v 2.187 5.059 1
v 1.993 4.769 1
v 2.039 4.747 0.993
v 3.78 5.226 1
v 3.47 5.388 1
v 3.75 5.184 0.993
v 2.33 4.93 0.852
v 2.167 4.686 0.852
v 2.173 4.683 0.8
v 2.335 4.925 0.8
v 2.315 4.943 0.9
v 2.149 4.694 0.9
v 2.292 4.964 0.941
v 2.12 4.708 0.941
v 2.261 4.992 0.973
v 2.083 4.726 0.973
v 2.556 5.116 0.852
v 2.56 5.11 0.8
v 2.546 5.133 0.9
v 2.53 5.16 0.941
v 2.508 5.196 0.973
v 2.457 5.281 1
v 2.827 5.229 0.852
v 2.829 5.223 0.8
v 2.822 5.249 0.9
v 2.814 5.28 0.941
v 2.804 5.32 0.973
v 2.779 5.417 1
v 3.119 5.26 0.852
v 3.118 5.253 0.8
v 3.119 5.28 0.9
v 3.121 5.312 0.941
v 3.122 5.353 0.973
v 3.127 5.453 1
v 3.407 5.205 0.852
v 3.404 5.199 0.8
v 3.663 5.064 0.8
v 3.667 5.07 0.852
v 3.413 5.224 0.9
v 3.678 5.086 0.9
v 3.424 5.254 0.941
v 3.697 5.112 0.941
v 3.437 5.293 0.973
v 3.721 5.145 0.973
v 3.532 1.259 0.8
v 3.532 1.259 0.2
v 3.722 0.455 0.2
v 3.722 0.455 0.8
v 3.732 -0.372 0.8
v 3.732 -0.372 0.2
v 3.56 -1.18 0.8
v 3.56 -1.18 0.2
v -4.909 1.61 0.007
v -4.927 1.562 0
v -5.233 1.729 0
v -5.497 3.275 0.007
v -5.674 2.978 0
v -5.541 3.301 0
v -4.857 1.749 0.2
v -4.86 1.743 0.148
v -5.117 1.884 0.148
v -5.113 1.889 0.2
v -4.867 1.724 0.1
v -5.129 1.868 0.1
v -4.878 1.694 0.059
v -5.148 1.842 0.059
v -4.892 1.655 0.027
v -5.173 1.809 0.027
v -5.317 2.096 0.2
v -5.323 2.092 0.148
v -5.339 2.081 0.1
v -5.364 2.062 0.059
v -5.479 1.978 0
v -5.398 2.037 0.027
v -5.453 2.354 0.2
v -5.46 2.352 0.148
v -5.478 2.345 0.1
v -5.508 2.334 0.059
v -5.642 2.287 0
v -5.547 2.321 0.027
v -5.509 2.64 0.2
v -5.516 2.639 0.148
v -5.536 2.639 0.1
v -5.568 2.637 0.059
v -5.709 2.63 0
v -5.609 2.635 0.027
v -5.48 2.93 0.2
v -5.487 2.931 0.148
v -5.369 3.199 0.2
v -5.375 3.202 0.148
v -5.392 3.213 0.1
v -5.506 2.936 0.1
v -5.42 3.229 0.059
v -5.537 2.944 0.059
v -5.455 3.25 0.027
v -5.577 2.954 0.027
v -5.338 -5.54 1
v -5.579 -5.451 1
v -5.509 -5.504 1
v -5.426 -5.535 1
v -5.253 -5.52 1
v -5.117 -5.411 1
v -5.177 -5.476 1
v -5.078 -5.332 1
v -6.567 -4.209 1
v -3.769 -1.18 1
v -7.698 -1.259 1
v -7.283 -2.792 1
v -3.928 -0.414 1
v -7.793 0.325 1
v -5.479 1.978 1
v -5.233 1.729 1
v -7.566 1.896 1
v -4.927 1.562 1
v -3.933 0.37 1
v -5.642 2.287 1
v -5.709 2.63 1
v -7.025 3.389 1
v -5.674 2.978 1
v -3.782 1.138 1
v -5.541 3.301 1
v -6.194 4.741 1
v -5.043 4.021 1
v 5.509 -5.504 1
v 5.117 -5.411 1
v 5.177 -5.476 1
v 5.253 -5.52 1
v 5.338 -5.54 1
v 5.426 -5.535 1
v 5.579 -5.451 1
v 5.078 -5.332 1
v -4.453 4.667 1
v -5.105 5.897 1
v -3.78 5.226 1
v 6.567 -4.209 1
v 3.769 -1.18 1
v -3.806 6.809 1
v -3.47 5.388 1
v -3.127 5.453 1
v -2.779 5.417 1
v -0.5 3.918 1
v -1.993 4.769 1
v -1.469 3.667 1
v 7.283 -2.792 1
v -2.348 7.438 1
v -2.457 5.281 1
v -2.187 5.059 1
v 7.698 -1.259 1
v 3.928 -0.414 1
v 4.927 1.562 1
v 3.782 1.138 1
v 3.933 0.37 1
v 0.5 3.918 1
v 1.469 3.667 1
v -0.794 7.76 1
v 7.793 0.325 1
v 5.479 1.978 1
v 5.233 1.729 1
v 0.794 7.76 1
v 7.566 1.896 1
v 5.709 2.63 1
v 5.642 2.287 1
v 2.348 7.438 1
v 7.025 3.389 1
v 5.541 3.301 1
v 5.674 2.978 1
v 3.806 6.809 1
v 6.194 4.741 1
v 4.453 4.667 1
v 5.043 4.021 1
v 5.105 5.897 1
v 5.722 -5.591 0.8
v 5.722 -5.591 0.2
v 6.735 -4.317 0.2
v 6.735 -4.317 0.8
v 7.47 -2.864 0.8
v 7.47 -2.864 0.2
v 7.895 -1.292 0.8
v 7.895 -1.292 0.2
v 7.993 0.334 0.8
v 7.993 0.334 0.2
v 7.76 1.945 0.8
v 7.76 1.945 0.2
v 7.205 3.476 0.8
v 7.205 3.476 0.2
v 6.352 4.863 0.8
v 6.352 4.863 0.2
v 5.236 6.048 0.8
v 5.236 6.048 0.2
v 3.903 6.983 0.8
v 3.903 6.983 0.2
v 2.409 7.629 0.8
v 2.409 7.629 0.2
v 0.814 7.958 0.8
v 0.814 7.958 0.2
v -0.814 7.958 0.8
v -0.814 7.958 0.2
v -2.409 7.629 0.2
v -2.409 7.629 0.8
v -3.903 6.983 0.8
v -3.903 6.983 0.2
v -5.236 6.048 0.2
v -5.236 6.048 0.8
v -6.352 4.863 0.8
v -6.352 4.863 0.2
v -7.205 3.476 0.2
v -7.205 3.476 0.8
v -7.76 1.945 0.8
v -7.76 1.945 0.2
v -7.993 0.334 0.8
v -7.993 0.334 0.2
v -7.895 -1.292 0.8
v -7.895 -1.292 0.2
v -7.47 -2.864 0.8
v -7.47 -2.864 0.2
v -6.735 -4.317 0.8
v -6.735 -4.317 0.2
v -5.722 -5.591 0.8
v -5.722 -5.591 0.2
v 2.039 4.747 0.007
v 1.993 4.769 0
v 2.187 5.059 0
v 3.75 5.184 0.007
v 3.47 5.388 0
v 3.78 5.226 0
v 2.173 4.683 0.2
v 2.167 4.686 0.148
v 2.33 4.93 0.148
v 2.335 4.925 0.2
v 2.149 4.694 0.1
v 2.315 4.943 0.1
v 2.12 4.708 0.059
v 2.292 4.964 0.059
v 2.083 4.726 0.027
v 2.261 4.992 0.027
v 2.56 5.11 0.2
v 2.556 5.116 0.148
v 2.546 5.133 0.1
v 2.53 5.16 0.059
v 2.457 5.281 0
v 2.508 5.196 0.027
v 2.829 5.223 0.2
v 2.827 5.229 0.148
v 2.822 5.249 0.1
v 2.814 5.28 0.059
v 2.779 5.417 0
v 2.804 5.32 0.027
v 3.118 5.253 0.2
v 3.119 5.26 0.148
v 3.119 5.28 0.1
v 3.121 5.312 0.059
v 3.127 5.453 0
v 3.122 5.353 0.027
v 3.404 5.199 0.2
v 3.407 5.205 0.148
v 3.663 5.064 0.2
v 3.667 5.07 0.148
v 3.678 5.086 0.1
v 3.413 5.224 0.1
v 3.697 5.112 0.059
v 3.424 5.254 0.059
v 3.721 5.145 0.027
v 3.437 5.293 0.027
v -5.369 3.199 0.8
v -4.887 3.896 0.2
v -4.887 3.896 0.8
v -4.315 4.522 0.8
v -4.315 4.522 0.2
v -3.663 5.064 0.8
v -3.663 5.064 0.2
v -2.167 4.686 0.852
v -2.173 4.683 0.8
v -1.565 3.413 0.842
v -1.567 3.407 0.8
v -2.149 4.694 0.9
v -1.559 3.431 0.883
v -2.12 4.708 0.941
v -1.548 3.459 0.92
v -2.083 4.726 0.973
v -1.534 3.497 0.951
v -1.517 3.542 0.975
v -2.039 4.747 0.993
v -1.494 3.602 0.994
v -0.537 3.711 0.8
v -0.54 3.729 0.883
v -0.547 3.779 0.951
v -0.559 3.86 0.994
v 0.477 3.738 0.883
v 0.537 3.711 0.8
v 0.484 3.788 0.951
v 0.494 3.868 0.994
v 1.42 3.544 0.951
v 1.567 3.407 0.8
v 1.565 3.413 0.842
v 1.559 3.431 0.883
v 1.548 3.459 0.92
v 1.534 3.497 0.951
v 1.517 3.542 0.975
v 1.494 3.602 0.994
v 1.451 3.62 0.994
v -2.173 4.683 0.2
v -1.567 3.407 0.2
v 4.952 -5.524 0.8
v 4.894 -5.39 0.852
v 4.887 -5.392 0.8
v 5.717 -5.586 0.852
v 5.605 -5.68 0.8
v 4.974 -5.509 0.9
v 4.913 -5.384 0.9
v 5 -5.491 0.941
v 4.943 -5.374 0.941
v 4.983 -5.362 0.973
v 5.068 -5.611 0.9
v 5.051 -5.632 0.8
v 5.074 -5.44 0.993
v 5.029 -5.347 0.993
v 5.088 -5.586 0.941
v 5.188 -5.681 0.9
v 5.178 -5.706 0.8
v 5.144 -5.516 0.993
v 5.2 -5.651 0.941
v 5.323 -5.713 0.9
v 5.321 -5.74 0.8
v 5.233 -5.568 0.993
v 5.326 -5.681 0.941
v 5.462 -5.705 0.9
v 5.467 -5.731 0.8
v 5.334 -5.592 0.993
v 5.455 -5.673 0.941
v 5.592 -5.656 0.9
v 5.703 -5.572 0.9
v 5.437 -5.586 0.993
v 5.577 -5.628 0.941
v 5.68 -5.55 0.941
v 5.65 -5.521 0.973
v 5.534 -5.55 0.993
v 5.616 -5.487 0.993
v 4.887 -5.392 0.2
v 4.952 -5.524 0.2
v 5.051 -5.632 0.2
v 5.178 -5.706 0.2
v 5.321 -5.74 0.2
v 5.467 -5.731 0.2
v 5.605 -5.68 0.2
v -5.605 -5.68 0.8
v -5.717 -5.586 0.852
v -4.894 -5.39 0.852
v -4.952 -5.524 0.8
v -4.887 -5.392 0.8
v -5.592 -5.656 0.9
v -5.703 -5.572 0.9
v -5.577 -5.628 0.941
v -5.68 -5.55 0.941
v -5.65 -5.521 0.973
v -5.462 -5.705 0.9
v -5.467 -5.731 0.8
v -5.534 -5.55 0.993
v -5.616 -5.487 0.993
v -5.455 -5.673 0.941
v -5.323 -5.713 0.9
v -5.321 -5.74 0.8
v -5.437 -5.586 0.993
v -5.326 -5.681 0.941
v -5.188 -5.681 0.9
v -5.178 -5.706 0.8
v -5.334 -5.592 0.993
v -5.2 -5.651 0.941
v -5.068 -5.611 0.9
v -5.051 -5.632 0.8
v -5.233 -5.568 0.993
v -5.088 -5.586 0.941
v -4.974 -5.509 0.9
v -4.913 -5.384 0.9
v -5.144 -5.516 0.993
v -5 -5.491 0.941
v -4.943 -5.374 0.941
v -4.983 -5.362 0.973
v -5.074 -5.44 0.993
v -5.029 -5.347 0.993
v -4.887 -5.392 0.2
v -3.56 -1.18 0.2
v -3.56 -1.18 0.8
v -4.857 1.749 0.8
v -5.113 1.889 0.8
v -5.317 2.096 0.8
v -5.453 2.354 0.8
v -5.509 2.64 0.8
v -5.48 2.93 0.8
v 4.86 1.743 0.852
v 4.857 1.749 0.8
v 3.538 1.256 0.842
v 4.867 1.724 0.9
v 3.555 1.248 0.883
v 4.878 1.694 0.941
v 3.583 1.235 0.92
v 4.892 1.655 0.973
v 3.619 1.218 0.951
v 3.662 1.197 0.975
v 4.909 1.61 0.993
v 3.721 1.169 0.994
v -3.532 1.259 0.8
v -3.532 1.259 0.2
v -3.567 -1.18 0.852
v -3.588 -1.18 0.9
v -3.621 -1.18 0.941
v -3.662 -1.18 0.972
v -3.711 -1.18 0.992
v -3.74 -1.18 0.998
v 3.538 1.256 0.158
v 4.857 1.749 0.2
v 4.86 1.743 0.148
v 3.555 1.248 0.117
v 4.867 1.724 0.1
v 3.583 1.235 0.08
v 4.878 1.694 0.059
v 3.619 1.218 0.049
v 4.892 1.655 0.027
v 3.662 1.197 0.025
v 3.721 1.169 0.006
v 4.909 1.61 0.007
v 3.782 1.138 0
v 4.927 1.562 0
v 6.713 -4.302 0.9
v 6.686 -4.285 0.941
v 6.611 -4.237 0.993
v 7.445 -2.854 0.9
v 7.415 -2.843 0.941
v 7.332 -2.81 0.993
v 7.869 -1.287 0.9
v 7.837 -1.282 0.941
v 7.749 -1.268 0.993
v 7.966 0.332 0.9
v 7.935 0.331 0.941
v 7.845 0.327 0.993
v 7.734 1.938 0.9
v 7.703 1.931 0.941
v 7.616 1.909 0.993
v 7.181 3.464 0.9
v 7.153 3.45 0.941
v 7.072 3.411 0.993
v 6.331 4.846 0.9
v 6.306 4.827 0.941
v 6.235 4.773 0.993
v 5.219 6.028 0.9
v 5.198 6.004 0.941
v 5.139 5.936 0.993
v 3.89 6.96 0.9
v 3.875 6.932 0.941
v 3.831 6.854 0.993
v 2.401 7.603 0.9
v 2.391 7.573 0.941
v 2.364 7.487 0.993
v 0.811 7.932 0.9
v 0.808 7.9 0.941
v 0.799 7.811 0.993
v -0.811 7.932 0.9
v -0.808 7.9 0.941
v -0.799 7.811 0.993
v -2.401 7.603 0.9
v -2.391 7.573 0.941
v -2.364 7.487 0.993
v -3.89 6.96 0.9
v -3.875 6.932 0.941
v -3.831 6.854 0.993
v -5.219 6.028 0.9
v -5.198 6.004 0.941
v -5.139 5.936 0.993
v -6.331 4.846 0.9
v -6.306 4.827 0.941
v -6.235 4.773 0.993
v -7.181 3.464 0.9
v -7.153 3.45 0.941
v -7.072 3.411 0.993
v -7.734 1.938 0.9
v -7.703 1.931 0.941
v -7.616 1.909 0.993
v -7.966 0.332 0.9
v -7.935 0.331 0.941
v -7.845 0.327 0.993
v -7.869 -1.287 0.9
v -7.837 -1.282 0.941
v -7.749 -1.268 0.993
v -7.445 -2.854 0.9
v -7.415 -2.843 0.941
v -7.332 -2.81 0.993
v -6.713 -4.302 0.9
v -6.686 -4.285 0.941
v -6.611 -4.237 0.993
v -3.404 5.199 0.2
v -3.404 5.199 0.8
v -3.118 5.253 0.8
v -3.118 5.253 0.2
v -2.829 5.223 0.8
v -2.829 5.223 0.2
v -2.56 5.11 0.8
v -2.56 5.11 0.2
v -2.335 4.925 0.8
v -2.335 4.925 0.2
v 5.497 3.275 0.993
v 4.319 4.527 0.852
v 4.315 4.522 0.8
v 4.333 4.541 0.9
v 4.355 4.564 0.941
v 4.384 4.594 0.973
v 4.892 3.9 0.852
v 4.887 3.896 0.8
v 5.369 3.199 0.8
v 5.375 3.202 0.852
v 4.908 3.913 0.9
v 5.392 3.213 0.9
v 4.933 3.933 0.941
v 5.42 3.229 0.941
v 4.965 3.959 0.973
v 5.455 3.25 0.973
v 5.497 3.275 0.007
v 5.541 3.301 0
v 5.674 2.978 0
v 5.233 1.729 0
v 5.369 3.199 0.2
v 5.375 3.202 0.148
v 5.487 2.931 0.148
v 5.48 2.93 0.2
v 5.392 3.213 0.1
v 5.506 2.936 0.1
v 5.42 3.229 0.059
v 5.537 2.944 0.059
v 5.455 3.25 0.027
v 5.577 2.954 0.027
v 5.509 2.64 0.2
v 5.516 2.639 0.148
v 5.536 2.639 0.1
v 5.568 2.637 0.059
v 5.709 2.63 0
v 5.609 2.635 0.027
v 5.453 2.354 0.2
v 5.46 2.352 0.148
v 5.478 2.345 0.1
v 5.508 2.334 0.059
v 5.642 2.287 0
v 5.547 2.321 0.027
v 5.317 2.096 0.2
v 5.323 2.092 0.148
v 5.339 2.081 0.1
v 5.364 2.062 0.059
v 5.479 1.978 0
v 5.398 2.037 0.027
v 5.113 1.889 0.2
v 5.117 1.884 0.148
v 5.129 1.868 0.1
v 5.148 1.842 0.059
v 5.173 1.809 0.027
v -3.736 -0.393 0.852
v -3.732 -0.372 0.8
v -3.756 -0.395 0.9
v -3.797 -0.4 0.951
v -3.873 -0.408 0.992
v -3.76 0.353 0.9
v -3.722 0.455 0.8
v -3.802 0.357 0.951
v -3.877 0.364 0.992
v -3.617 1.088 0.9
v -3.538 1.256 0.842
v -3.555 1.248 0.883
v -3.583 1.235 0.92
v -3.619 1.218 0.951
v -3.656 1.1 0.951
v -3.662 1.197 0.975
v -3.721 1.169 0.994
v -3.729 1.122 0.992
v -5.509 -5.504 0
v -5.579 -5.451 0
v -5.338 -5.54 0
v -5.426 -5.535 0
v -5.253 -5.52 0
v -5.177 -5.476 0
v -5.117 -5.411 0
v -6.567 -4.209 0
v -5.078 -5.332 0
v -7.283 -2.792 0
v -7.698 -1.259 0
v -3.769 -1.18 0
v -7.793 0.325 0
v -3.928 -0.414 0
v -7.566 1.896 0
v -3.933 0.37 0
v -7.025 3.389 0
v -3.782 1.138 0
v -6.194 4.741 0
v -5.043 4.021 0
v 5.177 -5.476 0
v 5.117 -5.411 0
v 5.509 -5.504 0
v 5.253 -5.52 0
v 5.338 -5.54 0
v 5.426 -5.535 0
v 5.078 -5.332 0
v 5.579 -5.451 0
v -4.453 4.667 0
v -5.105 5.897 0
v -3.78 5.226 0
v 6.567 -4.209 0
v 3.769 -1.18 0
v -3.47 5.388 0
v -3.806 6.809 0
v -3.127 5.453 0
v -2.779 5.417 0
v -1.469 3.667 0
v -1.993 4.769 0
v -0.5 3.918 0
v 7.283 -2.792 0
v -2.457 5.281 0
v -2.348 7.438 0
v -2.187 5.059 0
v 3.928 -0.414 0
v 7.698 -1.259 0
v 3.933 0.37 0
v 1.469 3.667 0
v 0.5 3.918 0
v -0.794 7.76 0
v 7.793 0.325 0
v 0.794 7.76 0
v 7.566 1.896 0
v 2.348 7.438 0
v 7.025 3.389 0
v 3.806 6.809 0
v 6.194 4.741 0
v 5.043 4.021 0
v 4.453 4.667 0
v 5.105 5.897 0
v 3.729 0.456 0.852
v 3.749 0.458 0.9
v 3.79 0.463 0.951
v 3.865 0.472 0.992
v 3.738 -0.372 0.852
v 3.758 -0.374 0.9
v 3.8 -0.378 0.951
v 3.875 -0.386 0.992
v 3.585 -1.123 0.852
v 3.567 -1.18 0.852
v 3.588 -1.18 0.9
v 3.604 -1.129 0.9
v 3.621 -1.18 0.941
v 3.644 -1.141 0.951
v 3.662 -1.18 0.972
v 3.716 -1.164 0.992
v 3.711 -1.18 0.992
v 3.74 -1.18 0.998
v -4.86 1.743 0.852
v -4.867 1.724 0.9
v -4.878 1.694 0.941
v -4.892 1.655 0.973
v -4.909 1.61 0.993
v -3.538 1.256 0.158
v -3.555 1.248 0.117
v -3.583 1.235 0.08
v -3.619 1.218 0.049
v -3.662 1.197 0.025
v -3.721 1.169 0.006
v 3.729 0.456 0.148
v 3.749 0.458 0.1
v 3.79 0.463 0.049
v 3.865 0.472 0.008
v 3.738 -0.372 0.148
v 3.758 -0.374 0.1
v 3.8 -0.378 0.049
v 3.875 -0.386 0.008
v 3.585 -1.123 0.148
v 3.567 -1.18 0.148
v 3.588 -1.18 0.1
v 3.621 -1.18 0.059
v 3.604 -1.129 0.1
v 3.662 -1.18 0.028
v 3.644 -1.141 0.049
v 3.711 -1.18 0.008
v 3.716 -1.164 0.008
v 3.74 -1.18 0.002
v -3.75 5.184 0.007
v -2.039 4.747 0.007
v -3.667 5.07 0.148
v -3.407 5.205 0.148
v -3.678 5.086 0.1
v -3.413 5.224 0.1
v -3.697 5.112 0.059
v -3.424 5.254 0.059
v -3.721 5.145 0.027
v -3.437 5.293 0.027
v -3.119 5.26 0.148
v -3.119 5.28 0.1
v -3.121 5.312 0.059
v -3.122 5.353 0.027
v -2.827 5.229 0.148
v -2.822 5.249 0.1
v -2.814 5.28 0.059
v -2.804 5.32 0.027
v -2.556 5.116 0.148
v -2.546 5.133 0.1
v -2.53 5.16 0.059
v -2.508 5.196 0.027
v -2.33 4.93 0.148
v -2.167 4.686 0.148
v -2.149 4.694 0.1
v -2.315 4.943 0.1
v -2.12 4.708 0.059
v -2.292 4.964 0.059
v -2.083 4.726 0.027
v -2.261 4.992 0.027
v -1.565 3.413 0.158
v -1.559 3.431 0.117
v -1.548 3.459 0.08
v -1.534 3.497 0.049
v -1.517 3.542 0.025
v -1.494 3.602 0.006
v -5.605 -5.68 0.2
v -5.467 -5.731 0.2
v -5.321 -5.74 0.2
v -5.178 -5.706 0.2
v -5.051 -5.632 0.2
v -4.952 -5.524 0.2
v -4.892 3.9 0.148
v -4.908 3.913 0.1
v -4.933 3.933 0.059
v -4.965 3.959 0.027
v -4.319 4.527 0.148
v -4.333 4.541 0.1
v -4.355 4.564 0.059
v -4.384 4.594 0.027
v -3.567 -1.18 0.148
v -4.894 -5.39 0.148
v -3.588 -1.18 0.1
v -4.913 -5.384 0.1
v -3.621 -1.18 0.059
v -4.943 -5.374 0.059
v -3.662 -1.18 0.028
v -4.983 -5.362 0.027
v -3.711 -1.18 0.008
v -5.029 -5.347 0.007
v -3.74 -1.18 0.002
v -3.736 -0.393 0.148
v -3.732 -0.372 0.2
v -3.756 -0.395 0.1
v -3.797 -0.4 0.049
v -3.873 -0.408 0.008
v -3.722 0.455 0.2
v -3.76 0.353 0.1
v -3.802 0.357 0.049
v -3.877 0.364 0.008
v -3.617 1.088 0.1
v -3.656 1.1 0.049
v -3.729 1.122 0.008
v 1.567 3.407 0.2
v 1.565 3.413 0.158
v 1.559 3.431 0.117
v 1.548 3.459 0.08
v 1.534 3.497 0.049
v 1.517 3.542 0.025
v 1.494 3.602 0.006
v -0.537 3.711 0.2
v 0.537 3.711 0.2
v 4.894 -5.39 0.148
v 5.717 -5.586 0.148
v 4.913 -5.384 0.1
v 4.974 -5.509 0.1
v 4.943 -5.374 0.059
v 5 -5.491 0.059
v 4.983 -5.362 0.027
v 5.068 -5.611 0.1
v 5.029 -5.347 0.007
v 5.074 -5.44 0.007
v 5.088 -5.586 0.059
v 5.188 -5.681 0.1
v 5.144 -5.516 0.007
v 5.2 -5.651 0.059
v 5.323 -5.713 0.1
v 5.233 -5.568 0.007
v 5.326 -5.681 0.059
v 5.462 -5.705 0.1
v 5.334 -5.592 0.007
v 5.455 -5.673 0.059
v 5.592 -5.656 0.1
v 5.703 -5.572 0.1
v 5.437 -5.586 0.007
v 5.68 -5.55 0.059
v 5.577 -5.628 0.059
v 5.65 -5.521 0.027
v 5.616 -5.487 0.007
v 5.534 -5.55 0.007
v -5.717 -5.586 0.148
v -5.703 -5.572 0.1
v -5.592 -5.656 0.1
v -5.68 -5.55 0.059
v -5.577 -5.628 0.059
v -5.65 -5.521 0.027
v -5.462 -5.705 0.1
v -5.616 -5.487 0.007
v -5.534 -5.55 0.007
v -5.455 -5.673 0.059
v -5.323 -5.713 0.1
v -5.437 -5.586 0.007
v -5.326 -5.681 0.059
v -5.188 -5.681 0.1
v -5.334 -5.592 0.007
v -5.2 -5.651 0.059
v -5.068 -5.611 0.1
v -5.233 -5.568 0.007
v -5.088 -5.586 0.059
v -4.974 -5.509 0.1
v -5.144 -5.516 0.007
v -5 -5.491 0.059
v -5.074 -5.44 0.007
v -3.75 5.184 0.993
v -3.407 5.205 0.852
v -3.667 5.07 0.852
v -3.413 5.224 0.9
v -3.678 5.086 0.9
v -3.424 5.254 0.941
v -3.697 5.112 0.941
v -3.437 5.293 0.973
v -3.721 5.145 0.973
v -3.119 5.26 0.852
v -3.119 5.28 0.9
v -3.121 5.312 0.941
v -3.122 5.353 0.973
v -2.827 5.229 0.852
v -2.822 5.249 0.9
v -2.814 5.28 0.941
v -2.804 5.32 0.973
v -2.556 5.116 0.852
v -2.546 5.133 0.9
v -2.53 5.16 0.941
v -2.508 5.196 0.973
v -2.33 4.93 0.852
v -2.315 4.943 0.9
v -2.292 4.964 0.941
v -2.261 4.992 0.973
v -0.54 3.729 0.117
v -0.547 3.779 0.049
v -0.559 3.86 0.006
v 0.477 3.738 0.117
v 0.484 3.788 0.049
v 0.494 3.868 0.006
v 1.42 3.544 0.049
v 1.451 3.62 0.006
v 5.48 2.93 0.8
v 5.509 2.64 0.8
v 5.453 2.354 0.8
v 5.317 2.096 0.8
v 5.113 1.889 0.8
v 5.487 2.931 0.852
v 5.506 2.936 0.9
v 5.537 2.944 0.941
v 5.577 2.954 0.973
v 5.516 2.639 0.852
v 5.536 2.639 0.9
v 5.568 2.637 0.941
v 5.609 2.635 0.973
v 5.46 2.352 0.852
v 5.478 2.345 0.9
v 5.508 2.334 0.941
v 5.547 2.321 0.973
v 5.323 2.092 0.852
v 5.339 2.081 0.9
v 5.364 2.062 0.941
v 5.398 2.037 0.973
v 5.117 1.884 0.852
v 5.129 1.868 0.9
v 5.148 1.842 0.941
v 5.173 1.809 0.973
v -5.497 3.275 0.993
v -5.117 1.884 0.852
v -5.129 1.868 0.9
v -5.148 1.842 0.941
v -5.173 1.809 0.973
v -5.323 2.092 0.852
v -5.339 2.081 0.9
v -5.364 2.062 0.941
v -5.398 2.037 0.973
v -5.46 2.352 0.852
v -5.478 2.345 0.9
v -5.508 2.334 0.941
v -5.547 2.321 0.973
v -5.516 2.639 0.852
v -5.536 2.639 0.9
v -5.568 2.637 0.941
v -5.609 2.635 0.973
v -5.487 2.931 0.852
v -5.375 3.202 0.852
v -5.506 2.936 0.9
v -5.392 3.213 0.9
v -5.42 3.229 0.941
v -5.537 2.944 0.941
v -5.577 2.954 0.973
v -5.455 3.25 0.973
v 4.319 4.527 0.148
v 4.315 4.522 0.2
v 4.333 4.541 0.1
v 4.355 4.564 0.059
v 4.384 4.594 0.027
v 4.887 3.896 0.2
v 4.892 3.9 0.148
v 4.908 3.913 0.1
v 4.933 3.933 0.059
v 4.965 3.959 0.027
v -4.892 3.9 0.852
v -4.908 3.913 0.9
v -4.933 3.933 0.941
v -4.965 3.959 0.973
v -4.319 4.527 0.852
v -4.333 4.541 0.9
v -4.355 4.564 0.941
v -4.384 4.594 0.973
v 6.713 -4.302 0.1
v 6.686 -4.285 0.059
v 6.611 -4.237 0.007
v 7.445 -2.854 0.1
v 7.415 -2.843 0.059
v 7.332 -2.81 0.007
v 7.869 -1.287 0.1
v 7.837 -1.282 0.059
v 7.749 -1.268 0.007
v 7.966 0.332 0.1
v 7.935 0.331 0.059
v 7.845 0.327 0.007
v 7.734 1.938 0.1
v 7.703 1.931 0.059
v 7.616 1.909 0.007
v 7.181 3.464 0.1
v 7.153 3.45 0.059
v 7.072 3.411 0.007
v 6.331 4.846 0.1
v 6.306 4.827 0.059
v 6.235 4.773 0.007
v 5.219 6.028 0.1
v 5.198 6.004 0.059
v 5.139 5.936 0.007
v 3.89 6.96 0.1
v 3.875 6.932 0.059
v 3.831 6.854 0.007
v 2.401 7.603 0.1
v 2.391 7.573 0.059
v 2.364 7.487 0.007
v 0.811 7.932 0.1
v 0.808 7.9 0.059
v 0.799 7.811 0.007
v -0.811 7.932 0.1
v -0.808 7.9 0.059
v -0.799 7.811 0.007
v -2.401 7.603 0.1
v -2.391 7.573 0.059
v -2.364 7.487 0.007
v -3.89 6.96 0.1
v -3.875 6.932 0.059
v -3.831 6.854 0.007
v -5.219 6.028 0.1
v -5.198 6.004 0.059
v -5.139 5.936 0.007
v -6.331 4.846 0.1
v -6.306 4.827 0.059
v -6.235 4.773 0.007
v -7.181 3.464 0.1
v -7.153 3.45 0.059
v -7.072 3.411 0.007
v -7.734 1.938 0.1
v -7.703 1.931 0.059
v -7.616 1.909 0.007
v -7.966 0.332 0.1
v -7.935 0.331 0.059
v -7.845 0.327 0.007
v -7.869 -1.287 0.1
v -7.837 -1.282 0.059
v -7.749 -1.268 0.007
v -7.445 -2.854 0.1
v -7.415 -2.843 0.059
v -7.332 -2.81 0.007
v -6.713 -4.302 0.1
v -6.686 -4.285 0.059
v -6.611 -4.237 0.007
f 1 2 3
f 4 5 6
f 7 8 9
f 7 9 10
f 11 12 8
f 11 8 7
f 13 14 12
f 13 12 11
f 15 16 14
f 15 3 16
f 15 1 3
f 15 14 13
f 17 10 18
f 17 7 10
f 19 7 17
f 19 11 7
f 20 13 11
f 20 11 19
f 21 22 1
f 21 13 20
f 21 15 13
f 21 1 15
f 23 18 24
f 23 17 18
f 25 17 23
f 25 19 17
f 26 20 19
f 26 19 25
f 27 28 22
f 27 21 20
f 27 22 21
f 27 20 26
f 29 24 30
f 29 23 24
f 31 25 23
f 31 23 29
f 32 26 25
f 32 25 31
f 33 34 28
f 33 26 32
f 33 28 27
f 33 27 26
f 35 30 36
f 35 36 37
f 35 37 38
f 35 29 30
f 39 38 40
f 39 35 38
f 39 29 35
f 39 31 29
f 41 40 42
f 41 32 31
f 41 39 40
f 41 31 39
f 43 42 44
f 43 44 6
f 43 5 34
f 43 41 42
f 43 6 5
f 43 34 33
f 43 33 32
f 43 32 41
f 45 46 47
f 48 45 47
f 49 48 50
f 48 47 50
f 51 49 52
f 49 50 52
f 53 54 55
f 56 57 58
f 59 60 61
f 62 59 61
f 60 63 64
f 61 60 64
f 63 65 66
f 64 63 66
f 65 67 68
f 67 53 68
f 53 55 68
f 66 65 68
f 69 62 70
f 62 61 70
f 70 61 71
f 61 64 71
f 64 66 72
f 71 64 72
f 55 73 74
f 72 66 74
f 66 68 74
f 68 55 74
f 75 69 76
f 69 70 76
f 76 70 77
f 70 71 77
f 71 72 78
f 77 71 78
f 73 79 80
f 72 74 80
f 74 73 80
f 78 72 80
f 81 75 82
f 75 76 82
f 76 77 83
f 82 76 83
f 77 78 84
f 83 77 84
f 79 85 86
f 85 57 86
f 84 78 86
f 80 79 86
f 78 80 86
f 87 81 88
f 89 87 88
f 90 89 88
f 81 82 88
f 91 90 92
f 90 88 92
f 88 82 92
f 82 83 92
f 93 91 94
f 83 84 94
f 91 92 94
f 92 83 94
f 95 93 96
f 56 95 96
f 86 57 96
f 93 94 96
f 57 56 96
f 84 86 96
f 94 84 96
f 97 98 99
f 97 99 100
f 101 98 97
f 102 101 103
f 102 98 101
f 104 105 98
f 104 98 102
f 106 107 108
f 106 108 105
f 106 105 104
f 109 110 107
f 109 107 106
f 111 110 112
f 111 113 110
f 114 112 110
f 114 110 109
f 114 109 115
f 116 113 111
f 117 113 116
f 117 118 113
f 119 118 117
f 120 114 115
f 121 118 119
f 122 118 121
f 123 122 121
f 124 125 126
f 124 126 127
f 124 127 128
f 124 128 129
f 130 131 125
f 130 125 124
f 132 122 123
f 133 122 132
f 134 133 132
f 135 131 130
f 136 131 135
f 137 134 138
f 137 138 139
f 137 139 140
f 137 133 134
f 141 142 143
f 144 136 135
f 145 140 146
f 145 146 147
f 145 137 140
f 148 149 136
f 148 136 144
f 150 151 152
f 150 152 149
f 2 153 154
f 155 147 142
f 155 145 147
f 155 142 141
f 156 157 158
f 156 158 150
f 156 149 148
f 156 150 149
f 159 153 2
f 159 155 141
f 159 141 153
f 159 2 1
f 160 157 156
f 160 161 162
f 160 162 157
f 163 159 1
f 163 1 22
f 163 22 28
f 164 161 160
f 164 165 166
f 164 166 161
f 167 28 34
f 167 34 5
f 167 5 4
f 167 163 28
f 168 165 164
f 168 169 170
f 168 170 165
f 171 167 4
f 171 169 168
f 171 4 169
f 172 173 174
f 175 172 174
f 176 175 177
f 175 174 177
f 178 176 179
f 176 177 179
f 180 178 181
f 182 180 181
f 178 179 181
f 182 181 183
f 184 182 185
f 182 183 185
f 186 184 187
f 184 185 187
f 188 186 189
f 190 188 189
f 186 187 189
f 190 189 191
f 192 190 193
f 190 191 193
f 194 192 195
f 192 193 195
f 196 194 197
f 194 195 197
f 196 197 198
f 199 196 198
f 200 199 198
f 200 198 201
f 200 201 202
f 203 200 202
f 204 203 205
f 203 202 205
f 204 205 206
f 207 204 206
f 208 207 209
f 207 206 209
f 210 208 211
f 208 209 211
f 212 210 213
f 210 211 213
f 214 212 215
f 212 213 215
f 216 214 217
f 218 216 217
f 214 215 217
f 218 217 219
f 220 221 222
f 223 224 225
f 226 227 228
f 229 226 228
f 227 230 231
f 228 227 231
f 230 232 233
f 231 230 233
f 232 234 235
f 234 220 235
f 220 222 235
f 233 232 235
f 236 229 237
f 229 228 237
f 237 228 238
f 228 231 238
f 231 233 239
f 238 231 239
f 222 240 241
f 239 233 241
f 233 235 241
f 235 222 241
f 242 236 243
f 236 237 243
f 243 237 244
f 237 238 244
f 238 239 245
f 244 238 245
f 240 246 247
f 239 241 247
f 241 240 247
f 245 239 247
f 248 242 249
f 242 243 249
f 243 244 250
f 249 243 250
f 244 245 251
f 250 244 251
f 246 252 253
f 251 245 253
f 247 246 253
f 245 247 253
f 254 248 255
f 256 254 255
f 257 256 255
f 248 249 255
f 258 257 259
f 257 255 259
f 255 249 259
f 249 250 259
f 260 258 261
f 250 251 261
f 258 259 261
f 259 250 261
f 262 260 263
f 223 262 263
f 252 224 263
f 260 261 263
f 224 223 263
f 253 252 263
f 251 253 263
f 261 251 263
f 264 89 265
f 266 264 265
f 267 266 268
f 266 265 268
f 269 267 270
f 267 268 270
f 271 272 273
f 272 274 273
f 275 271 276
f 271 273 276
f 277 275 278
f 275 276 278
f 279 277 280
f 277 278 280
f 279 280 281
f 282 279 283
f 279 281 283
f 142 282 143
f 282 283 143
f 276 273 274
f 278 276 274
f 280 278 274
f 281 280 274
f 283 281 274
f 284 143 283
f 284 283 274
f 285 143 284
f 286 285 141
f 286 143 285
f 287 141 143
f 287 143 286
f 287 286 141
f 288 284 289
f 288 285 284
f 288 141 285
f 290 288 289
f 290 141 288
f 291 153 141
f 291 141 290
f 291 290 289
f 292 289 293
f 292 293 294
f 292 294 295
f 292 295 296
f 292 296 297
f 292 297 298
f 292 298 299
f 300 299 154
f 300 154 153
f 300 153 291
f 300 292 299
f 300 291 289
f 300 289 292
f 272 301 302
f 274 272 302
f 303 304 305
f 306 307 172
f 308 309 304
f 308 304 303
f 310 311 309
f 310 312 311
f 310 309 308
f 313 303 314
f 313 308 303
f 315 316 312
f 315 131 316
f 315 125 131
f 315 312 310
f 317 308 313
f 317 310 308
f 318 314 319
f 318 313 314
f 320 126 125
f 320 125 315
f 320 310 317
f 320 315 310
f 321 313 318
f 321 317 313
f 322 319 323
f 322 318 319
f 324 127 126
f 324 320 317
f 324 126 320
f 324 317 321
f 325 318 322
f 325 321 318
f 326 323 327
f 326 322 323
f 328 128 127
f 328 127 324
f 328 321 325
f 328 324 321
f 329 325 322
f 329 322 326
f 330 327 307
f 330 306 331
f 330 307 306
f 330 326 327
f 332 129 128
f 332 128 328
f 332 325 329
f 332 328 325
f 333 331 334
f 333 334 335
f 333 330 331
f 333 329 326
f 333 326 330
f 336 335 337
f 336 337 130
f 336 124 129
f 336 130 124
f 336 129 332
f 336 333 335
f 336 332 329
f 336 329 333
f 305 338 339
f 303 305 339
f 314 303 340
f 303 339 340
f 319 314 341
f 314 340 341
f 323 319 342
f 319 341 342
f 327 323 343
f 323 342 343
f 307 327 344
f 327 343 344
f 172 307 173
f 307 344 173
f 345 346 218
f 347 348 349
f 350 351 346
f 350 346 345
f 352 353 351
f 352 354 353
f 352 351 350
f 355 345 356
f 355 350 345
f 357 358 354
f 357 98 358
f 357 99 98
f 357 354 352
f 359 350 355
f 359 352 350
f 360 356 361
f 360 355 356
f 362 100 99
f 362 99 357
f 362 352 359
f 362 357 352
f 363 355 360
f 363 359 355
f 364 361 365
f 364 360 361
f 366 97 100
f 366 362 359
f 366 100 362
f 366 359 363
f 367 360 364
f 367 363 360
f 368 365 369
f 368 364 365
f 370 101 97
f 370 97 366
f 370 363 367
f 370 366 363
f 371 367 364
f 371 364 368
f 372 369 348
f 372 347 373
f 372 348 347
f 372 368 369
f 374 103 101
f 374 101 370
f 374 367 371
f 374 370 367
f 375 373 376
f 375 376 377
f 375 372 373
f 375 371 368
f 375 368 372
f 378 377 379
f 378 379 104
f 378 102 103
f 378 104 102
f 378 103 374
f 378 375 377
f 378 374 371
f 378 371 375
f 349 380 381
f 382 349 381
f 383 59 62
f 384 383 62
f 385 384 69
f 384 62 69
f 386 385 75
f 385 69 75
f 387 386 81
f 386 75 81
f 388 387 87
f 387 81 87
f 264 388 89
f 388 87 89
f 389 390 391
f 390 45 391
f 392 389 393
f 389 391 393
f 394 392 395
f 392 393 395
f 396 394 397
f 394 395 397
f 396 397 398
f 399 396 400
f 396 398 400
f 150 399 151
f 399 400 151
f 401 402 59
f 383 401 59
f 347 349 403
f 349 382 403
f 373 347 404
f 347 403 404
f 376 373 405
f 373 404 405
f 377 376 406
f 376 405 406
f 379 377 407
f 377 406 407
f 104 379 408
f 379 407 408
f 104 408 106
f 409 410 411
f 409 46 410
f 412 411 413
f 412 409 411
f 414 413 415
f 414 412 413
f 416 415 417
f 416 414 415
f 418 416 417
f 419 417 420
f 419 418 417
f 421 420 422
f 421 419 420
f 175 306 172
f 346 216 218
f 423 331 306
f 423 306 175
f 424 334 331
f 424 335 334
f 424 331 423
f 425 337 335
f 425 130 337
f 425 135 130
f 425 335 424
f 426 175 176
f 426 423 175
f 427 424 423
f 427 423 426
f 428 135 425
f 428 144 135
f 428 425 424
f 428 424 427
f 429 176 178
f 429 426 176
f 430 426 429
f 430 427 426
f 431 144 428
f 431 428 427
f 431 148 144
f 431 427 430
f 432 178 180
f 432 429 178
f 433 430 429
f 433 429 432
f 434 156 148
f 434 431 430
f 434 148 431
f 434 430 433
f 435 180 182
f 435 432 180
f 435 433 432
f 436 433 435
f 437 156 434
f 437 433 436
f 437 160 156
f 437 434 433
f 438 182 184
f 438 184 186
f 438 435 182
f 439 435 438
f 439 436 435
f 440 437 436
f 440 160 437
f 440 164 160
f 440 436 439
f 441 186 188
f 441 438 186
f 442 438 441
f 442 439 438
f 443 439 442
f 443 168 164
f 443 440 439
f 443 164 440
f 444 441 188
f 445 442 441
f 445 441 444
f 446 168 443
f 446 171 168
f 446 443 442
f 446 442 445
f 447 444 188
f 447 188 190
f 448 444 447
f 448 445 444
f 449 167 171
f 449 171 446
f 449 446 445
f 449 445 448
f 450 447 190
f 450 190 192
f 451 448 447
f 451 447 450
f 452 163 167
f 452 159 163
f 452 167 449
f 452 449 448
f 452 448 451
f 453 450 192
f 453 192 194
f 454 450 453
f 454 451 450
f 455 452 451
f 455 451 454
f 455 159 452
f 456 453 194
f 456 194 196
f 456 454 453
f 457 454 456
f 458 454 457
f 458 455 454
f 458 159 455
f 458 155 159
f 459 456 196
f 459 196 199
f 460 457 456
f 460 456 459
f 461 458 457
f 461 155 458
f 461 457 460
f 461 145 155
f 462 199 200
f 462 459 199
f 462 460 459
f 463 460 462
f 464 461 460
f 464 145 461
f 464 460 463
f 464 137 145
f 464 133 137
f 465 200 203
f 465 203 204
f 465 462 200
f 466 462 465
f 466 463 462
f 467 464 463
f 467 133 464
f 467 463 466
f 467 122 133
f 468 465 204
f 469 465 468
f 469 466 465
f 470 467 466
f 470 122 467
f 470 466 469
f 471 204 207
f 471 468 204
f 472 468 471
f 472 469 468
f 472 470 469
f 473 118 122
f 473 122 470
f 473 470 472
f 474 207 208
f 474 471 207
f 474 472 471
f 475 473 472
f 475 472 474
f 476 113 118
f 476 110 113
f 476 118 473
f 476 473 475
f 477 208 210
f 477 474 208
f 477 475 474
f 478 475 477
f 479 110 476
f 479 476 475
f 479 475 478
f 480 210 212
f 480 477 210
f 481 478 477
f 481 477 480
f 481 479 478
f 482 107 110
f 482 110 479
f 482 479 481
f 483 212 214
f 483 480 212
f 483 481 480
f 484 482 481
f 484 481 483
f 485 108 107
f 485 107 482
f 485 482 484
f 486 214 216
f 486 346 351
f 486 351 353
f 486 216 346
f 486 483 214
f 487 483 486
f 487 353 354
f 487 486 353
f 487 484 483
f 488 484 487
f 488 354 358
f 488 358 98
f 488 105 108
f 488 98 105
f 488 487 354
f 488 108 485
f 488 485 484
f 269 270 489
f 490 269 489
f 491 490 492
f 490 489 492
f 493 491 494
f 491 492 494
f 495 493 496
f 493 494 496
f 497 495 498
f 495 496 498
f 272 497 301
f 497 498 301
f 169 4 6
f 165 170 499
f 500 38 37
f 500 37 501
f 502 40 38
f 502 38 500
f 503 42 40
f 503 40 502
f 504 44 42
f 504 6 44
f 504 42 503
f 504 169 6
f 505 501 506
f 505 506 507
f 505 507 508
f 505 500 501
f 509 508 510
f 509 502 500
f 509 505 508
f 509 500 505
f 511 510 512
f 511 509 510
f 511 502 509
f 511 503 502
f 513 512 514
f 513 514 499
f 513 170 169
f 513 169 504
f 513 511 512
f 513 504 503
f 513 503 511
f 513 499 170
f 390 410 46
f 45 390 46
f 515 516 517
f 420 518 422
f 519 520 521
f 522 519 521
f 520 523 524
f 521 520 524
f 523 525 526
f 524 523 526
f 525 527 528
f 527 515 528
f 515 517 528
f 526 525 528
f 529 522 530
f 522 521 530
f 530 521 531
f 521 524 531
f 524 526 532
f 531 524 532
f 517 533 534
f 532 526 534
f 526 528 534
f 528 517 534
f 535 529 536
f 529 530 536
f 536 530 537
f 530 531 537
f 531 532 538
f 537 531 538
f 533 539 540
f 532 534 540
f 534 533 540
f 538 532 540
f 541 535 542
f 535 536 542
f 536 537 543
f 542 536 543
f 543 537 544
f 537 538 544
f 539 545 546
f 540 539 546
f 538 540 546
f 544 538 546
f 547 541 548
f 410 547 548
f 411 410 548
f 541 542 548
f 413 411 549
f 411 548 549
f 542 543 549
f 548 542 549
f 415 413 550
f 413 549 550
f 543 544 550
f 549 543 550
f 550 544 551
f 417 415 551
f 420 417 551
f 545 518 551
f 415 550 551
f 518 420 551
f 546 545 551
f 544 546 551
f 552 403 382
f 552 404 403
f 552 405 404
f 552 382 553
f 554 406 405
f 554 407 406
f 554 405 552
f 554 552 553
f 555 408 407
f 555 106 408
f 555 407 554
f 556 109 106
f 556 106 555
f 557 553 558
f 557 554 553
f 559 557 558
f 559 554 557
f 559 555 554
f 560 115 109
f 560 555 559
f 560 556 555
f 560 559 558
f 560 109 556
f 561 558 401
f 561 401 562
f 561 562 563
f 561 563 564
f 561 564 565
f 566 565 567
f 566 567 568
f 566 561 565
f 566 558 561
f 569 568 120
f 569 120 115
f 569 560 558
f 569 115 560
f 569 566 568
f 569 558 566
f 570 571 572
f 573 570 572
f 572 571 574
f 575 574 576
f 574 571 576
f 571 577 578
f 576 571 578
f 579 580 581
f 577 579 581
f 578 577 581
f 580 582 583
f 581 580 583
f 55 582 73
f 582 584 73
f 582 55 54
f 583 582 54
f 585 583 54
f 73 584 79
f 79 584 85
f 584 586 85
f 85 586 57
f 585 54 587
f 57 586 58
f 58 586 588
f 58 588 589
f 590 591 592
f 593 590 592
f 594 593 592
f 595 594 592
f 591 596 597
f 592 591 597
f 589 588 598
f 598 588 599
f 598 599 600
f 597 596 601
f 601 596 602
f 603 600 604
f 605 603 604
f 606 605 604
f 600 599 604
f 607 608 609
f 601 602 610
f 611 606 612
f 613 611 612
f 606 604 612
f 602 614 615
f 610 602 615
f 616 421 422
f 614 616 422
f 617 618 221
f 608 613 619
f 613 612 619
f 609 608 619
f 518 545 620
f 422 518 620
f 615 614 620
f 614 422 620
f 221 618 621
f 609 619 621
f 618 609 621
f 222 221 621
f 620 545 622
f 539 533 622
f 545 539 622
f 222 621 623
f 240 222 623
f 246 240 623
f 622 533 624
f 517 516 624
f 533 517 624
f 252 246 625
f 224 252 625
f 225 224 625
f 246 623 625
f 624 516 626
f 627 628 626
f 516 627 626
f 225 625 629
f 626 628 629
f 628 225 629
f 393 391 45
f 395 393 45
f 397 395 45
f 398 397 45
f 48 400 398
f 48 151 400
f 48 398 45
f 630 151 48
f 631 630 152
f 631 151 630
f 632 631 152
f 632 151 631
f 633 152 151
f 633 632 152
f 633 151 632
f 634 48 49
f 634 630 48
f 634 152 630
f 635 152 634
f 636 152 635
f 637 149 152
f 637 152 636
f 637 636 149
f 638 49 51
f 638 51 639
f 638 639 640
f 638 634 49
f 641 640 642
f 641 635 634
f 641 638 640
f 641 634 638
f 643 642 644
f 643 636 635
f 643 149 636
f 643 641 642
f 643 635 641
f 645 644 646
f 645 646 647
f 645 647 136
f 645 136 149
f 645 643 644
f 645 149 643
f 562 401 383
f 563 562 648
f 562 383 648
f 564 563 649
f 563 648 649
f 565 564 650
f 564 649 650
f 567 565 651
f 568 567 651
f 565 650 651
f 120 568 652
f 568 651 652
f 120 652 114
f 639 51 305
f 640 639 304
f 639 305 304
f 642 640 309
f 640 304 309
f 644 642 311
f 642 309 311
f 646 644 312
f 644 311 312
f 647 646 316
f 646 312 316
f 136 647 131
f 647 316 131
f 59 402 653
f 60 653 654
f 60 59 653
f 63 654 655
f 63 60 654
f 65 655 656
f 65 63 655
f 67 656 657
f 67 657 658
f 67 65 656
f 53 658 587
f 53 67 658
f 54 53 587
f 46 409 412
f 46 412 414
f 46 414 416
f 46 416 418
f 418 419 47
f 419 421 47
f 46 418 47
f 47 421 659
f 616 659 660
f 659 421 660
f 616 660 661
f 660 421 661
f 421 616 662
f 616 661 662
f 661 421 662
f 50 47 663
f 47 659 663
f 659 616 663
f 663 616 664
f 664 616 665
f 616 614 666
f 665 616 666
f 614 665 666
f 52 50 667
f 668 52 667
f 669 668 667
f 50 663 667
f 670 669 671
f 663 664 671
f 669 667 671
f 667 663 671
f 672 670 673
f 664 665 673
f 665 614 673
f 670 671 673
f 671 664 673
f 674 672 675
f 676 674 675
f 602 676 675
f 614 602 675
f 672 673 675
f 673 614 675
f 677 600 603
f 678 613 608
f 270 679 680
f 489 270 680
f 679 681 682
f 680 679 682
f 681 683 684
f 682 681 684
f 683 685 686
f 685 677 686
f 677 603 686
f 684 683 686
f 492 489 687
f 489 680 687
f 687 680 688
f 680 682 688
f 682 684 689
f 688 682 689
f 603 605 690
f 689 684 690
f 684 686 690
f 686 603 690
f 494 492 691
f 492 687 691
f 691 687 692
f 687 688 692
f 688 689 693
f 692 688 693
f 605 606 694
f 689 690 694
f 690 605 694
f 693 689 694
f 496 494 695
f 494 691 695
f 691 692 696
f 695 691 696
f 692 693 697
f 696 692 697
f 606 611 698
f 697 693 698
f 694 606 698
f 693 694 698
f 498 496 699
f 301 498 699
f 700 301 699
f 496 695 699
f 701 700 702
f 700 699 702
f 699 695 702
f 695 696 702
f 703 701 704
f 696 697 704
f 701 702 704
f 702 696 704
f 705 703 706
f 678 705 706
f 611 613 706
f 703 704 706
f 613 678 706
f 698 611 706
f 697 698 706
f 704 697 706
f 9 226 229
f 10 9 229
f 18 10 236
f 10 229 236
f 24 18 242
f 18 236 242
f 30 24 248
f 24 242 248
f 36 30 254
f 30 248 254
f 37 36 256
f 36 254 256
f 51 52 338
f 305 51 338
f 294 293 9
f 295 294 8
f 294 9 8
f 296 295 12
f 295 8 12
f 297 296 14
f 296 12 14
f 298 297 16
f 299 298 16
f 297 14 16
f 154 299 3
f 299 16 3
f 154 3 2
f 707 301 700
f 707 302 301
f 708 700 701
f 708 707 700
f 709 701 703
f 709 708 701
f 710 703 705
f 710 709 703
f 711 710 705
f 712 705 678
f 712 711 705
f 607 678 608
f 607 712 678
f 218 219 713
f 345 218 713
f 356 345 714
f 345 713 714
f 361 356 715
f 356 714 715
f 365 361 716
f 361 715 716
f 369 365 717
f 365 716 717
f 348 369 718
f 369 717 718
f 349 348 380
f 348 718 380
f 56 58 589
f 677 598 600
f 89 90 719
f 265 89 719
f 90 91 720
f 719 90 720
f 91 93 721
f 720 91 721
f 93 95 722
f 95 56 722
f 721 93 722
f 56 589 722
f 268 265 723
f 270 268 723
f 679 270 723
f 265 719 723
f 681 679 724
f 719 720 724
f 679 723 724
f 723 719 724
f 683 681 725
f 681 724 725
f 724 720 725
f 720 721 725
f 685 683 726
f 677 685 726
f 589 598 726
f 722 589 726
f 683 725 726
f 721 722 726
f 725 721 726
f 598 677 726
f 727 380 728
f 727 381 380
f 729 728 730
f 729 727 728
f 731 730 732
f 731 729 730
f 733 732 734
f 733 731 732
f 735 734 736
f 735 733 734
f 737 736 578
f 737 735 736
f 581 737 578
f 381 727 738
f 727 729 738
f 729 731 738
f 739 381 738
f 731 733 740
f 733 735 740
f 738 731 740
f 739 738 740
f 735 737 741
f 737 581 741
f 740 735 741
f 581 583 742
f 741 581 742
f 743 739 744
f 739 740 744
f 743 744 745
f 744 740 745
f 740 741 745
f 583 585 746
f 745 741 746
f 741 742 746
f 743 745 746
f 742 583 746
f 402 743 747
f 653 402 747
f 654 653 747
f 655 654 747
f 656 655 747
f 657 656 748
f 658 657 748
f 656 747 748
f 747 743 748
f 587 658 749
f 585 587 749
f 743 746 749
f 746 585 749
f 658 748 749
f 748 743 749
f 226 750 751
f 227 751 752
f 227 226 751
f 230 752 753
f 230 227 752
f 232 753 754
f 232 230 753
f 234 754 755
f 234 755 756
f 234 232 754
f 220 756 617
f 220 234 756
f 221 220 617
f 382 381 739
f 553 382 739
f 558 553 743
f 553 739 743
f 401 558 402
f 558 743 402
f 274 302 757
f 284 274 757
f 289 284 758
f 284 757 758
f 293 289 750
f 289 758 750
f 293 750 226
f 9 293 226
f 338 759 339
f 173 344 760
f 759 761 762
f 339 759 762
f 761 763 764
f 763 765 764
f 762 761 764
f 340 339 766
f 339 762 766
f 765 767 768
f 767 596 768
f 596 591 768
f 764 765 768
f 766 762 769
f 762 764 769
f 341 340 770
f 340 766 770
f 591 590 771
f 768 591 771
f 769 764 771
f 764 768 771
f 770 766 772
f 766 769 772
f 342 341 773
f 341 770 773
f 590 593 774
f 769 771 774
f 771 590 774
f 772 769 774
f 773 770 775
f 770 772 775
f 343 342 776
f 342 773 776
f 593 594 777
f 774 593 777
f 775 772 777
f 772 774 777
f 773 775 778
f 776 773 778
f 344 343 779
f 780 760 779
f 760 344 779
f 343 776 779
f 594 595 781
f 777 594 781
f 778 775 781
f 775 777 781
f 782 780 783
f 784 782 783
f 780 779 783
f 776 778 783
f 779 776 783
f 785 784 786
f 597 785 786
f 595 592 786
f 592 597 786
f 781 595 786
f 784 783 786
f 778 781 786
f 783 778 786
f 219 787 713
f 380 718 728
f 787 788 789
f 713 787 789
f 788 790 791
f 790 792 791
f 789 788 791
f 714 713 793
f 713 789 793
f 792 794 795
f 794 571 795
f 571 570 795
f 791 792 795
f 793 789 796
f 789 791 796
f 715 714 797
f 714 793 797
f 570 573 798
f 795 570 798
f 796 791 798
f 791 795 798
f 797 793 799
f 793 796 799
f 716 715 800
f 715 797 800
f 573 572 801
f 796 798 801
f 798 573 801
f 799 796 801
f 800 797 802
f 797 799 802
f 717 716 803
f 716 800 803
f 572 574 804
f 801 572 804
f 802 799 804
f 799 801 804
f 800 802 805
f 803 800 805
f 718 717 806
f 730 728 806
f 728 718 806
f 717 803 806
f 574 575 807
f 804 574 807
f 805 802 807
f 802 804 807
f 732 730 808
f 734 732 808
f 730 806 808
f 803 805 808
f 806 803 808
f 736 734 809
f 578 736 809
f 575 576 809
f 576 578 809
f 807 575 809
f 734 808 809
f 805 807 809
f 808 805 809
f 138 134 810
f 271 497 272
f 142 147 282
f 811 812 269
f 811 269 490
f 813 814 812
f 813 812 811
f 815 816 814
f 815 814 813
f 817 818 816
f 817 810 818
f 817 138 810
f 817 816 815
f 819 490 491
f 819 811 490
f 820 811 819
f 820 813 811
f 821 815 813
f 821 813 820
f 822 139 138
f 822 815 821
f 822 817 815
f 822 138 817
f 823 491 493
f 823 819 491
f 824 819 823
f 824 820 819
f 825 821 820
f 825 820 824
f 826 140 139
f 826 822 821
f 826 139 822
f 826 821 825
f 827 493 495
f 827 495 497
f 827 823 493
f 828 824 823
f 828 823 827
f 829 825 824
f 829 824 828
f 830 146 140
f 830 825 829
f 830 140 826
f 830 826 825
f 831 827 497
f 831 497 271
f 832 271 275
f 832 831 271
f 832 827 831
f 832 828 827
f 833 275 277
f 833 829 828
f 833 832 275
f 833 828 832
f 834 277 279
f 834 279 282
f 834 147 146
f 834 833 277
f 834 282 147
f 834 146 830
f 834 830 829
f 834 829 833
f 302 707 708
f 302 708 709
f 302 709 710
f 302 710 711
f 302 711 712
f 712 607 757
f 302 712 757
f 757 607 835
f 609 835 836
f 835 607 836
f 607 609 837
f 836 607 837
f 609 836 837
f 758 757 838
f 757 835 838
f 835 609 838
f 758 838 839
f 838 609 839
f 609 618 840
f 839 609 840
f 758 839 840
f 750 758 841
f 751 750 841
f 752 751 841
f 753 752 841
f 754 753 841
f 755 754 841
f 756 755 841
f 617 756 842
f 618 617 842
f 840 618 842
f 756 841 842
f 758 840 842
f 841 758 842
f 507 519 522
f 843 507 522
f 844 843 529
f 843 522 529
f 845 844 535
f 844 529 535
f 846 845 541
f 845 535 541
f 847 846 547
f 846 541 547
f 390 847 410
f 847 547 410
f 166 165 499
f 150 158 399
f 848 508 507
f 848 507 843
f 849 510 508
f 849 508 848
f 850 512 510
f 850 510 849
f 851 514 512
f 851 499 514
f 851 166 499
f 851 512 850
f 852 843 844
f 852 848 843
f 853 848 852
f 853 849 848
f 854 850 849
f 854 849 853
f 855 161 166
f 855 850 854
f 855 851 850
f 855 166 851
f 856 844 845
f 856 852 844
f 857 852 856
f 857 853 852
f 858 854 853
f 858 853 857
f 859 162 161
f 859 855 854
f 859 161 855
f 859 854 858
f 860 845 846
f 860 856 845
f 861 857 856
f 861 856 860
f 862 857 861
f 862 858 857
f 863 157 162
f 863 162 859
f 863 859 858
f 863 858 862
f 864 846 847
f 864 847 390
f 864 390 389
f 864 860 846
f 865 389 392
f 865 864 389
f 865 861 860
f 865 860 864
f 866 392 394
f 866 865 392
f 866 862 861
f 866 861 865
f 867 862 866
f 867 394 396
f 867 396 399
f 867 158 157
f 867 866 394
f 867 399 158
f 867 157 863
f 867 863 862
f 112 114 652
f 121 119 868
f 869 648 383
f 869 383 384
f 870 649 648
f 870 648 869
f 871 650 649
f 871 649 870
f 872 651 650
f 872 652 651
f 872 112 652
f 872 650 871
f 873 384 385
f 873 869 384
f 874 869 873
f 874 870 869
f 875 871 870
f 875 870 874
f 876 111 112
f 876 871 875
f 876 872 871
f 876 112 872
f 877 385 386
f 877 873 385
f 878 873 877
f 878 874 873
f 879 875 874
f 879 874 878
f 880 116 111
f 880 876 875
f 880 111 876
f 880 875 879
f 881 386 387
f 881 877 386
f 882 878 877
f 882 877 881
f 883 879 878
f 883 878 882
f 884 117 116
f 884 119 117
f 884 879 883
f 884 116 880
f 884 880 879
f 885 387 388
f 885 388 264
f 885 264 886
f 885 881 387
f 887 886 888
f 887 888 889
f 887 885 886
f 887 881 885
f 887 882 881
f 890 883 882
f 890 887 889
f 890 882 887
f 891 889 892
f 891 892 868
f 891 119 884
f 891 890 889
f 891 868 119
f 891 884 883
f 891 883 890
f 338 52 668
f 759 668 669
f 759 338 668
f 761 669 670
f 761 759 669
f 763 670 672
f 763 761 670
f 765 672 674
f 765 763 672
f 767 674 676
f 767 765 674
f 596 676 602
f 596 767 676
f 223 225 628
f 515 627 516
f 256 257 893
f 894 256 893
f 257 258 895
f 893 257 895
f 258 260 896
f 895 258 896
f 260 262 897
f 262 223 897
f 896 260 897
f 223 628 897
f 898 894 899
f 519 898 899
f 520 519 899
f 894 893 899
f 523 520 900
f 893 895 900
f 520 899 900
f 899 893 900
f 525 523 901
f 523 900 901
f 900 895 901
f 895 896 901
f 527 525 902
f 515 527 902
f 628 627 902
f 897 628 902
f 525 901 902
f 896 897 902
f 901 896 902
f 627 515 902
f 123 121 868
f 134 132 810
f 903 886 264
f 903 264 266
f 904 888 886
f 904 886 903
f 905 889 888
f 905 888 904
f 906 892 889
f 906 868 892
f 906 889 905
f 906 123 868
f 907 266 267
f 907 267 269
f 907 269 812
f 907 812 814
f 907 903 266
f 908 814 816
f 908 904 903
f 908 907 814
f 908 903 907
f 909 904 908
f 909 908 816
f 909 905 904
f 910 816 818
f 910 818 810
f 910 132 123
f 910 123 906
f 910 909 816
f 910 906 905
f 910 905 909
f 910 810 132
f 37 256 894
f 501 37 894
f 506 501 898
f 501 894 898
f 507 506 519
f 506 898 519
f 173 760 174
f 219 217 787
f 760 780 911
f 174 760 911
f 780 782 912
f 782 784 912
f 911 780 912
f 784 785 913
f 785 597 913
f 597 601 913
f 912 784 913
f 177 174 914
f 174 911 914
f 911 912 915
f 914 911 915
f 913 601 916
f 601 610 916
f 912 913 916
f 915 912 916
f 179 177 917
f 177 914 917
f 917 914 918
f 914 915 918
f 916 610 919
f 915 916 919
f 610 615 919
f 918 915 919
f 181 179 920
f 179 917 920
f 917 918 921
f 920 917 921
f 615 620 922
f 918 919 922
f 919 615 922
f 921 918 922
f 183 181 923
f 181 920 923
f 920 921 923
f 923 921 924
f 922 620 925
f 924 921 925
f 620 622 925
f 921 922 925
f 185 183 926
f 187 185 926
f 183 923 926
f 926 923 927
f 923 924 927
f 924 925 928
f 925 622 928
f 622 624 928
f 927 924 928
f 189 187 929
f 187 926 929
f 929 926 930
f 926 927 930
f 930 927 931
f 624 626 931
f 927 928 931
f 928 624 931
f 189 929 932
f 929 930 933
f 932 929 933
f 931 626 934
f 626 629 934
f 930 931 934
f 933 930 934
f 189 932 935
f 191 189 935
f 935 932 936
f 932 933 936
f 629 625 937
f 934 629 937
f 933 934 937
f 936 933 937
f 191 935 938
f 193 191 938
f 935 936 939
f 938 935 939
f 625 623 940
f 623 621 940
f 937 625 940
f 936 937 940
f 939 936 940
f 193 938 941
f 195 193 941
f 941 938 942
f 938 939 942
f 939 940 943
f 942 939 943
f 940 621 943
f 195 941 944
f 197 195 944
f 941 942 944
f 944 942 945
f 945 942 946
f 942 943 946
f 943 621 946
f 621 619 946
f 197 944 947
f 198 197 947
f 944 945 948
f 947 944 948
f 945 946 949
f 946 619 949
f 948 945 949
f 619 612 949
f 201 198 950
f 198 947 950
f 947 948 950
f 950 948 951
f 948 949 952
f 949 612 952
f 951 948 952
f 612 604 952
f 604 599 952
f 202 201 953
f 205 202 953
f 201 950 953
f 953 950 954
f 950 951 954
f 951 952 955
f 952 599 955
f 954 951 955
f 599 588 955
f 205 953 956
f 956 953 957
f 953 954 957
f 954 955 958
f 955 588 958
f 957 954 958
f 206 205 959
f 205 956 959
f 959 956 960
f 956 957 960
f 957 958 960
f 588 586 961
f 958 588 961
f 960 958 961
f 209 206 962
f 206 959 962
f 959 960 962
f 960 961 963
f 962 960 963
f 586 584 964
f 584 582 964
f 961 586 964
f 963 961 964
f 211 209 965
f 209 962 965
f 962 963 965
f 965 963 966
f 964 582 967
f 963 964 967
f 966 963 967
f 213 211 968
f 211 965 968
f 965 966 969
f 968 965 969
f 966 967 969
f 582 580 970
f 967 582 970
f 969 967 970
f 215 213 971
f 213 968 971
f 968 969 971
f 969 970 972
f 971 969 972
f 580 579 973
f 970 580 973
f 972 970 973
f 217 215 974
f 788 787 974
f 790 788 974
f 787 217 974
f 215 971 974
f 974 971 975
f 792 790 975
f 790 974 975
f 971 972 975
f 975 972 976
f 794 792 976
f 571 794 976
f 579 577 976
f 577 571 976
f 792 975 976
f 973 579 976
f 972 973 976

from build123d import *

# Parameters (mm, degrees)
EXTRUSION1_DEPTH = 1
CONG_1_R         = 0.2


with BuildPart() as part:
    # Esquisse1 → Extrusion1 (new body)
    with BuildSketch(Plane.XY):
        with BuildLine():
            Line((1.567339183, 3.406750341), (2.17332983, 4.682952759))
            ThreePointArc((2.17332983, 4.682952759), (2.828616778, 5.222762649), (3.662694882, 5.064303131))
            ThreePointArc((3.662694882, 5.064303131), (4.611336081, 4.218777021), (5.369345735, 3.198847664))
            ThreePointArc((5.369345735, 3.198847664), (5.45316543, 2.353998589), (4.857336037, 1.749198592))
            Line((4.857336037, 1.749198592), (3.532393676, 1.258846662))
            ThreePointArc((3.532393676, 1.258846662), (3.749766965, 0.041805581), (3.559581546, -1.17977931))
            Line((3.559581546, -1.17977931), (4.887496838, -5.391867605))
            ThreePointArc((4.887496838, -5.391867605), (5.24832354, -5.727879403), (5.721984232, -5.59096561))
            ThreePointArc((5.721984232, -5.59096561), (0, 8), (-5.721984232, -5.59096561))
            ThreePointArc((-5.721984232, -5.59096561), (-5.24832354, -5.727879403), (-4.887496838, -5.391867605))
            Line((-4.887496838, -5.391867605), (-3.559581546, -1.17977931))
            ThreePointArc((-3.559581546, -1.17977931), (-3.749766965, 0.041805581), (-3.532393676, 1.258846662))
            Line((-3.532393676, 1.258846662), (-4.857336037, 1.749198592))
            ThreePointArc((-4.857336037, 1.749198592), (-5.45316543, 2.353998589), (-5.369345735, 3.198847664))
            ThreePointArc((-5.369345735, 3.198847664), (-4.611336081, 4.218777021), (-3.662694882, 5.064303131))
            ThreePointArc((-3.662694882, 5.064303131), (-2.828616778, 5.222762649), (-2.17332983, 4.682952759))
            Line((-2.17332983, 4.682952759), (-1.567339183, 3.406750341))
            ThreePointArc((-1.567339183, 3.406750341), (0, 3.75), (1.567339183, 3.406750341))
        make_face()
    extrude(amount=EXTRUSION1_DEPTH)

    # Congé1
    cong_1_edges = [part.edges().sort_by_distance(p)[0] for p in [
        (-2.828616778, 5.222762649, 0),
        (-2.828616778, 5.222762649, 1),
        (-1.870334507, 4.04485155, 0),
        (-1.870334507, 4.04485155, 1),
        (0, 3.75, 0),
        (0, 3.75, 1),
        (1.870334507, 4.04485155, 0),
        (1.870334507, 4.04485155, 1),
        (2.828616778, 5.222762649, 0),
        (2.828616778, 5.222762649, 1),
        (4.611336081, 4.218777021, 0),
        (4.611336081, 4.218777021, 1),
        (5.45316543, 2.353998589, 0),
        (5.45316543, 2.353998589, 1),
        (4.194864856, 1.504022627, 0),
        (4.194864856, 1.504022627, 1),
        (3.749766965, 0.041805581, 0),
        (3.749766965, 0.041805581, 1),
        (4.223539192, -3.285823458, 0),
        (4.223539192, -3.285823458, 1),
        (5.24832354, -5.727879403, 0),
        (5.24832354, -5.727879403, 1),
        (0, 8, 0),
        (0, 8, 1),
        (-5.24832354, -5.727879403, 0),
        (-5.24832354, -5.727879403, 1),
        (-4.223539192, -3.285823458, 0),
        (-4.223539192, -3.285823458, 1),
        (-3.749766965, 0.041805581, 0),
        (-3.749766965, 0.041805581, 1),
        (-4.194864856, 1.504022627, 0),
        (-4.194864856, 1.504022627, 1),
        (-5.45316543, 2.353998589, 0),
        (-5.45316543, 2.353998589, 1),
        (-4.611336081, 4.218777021, 0),
        (-4.611336081, 4.218777021, 1),
    ]]
    fillet(cong_1_edges, radius=CONG_1_R)


solid = part.part
